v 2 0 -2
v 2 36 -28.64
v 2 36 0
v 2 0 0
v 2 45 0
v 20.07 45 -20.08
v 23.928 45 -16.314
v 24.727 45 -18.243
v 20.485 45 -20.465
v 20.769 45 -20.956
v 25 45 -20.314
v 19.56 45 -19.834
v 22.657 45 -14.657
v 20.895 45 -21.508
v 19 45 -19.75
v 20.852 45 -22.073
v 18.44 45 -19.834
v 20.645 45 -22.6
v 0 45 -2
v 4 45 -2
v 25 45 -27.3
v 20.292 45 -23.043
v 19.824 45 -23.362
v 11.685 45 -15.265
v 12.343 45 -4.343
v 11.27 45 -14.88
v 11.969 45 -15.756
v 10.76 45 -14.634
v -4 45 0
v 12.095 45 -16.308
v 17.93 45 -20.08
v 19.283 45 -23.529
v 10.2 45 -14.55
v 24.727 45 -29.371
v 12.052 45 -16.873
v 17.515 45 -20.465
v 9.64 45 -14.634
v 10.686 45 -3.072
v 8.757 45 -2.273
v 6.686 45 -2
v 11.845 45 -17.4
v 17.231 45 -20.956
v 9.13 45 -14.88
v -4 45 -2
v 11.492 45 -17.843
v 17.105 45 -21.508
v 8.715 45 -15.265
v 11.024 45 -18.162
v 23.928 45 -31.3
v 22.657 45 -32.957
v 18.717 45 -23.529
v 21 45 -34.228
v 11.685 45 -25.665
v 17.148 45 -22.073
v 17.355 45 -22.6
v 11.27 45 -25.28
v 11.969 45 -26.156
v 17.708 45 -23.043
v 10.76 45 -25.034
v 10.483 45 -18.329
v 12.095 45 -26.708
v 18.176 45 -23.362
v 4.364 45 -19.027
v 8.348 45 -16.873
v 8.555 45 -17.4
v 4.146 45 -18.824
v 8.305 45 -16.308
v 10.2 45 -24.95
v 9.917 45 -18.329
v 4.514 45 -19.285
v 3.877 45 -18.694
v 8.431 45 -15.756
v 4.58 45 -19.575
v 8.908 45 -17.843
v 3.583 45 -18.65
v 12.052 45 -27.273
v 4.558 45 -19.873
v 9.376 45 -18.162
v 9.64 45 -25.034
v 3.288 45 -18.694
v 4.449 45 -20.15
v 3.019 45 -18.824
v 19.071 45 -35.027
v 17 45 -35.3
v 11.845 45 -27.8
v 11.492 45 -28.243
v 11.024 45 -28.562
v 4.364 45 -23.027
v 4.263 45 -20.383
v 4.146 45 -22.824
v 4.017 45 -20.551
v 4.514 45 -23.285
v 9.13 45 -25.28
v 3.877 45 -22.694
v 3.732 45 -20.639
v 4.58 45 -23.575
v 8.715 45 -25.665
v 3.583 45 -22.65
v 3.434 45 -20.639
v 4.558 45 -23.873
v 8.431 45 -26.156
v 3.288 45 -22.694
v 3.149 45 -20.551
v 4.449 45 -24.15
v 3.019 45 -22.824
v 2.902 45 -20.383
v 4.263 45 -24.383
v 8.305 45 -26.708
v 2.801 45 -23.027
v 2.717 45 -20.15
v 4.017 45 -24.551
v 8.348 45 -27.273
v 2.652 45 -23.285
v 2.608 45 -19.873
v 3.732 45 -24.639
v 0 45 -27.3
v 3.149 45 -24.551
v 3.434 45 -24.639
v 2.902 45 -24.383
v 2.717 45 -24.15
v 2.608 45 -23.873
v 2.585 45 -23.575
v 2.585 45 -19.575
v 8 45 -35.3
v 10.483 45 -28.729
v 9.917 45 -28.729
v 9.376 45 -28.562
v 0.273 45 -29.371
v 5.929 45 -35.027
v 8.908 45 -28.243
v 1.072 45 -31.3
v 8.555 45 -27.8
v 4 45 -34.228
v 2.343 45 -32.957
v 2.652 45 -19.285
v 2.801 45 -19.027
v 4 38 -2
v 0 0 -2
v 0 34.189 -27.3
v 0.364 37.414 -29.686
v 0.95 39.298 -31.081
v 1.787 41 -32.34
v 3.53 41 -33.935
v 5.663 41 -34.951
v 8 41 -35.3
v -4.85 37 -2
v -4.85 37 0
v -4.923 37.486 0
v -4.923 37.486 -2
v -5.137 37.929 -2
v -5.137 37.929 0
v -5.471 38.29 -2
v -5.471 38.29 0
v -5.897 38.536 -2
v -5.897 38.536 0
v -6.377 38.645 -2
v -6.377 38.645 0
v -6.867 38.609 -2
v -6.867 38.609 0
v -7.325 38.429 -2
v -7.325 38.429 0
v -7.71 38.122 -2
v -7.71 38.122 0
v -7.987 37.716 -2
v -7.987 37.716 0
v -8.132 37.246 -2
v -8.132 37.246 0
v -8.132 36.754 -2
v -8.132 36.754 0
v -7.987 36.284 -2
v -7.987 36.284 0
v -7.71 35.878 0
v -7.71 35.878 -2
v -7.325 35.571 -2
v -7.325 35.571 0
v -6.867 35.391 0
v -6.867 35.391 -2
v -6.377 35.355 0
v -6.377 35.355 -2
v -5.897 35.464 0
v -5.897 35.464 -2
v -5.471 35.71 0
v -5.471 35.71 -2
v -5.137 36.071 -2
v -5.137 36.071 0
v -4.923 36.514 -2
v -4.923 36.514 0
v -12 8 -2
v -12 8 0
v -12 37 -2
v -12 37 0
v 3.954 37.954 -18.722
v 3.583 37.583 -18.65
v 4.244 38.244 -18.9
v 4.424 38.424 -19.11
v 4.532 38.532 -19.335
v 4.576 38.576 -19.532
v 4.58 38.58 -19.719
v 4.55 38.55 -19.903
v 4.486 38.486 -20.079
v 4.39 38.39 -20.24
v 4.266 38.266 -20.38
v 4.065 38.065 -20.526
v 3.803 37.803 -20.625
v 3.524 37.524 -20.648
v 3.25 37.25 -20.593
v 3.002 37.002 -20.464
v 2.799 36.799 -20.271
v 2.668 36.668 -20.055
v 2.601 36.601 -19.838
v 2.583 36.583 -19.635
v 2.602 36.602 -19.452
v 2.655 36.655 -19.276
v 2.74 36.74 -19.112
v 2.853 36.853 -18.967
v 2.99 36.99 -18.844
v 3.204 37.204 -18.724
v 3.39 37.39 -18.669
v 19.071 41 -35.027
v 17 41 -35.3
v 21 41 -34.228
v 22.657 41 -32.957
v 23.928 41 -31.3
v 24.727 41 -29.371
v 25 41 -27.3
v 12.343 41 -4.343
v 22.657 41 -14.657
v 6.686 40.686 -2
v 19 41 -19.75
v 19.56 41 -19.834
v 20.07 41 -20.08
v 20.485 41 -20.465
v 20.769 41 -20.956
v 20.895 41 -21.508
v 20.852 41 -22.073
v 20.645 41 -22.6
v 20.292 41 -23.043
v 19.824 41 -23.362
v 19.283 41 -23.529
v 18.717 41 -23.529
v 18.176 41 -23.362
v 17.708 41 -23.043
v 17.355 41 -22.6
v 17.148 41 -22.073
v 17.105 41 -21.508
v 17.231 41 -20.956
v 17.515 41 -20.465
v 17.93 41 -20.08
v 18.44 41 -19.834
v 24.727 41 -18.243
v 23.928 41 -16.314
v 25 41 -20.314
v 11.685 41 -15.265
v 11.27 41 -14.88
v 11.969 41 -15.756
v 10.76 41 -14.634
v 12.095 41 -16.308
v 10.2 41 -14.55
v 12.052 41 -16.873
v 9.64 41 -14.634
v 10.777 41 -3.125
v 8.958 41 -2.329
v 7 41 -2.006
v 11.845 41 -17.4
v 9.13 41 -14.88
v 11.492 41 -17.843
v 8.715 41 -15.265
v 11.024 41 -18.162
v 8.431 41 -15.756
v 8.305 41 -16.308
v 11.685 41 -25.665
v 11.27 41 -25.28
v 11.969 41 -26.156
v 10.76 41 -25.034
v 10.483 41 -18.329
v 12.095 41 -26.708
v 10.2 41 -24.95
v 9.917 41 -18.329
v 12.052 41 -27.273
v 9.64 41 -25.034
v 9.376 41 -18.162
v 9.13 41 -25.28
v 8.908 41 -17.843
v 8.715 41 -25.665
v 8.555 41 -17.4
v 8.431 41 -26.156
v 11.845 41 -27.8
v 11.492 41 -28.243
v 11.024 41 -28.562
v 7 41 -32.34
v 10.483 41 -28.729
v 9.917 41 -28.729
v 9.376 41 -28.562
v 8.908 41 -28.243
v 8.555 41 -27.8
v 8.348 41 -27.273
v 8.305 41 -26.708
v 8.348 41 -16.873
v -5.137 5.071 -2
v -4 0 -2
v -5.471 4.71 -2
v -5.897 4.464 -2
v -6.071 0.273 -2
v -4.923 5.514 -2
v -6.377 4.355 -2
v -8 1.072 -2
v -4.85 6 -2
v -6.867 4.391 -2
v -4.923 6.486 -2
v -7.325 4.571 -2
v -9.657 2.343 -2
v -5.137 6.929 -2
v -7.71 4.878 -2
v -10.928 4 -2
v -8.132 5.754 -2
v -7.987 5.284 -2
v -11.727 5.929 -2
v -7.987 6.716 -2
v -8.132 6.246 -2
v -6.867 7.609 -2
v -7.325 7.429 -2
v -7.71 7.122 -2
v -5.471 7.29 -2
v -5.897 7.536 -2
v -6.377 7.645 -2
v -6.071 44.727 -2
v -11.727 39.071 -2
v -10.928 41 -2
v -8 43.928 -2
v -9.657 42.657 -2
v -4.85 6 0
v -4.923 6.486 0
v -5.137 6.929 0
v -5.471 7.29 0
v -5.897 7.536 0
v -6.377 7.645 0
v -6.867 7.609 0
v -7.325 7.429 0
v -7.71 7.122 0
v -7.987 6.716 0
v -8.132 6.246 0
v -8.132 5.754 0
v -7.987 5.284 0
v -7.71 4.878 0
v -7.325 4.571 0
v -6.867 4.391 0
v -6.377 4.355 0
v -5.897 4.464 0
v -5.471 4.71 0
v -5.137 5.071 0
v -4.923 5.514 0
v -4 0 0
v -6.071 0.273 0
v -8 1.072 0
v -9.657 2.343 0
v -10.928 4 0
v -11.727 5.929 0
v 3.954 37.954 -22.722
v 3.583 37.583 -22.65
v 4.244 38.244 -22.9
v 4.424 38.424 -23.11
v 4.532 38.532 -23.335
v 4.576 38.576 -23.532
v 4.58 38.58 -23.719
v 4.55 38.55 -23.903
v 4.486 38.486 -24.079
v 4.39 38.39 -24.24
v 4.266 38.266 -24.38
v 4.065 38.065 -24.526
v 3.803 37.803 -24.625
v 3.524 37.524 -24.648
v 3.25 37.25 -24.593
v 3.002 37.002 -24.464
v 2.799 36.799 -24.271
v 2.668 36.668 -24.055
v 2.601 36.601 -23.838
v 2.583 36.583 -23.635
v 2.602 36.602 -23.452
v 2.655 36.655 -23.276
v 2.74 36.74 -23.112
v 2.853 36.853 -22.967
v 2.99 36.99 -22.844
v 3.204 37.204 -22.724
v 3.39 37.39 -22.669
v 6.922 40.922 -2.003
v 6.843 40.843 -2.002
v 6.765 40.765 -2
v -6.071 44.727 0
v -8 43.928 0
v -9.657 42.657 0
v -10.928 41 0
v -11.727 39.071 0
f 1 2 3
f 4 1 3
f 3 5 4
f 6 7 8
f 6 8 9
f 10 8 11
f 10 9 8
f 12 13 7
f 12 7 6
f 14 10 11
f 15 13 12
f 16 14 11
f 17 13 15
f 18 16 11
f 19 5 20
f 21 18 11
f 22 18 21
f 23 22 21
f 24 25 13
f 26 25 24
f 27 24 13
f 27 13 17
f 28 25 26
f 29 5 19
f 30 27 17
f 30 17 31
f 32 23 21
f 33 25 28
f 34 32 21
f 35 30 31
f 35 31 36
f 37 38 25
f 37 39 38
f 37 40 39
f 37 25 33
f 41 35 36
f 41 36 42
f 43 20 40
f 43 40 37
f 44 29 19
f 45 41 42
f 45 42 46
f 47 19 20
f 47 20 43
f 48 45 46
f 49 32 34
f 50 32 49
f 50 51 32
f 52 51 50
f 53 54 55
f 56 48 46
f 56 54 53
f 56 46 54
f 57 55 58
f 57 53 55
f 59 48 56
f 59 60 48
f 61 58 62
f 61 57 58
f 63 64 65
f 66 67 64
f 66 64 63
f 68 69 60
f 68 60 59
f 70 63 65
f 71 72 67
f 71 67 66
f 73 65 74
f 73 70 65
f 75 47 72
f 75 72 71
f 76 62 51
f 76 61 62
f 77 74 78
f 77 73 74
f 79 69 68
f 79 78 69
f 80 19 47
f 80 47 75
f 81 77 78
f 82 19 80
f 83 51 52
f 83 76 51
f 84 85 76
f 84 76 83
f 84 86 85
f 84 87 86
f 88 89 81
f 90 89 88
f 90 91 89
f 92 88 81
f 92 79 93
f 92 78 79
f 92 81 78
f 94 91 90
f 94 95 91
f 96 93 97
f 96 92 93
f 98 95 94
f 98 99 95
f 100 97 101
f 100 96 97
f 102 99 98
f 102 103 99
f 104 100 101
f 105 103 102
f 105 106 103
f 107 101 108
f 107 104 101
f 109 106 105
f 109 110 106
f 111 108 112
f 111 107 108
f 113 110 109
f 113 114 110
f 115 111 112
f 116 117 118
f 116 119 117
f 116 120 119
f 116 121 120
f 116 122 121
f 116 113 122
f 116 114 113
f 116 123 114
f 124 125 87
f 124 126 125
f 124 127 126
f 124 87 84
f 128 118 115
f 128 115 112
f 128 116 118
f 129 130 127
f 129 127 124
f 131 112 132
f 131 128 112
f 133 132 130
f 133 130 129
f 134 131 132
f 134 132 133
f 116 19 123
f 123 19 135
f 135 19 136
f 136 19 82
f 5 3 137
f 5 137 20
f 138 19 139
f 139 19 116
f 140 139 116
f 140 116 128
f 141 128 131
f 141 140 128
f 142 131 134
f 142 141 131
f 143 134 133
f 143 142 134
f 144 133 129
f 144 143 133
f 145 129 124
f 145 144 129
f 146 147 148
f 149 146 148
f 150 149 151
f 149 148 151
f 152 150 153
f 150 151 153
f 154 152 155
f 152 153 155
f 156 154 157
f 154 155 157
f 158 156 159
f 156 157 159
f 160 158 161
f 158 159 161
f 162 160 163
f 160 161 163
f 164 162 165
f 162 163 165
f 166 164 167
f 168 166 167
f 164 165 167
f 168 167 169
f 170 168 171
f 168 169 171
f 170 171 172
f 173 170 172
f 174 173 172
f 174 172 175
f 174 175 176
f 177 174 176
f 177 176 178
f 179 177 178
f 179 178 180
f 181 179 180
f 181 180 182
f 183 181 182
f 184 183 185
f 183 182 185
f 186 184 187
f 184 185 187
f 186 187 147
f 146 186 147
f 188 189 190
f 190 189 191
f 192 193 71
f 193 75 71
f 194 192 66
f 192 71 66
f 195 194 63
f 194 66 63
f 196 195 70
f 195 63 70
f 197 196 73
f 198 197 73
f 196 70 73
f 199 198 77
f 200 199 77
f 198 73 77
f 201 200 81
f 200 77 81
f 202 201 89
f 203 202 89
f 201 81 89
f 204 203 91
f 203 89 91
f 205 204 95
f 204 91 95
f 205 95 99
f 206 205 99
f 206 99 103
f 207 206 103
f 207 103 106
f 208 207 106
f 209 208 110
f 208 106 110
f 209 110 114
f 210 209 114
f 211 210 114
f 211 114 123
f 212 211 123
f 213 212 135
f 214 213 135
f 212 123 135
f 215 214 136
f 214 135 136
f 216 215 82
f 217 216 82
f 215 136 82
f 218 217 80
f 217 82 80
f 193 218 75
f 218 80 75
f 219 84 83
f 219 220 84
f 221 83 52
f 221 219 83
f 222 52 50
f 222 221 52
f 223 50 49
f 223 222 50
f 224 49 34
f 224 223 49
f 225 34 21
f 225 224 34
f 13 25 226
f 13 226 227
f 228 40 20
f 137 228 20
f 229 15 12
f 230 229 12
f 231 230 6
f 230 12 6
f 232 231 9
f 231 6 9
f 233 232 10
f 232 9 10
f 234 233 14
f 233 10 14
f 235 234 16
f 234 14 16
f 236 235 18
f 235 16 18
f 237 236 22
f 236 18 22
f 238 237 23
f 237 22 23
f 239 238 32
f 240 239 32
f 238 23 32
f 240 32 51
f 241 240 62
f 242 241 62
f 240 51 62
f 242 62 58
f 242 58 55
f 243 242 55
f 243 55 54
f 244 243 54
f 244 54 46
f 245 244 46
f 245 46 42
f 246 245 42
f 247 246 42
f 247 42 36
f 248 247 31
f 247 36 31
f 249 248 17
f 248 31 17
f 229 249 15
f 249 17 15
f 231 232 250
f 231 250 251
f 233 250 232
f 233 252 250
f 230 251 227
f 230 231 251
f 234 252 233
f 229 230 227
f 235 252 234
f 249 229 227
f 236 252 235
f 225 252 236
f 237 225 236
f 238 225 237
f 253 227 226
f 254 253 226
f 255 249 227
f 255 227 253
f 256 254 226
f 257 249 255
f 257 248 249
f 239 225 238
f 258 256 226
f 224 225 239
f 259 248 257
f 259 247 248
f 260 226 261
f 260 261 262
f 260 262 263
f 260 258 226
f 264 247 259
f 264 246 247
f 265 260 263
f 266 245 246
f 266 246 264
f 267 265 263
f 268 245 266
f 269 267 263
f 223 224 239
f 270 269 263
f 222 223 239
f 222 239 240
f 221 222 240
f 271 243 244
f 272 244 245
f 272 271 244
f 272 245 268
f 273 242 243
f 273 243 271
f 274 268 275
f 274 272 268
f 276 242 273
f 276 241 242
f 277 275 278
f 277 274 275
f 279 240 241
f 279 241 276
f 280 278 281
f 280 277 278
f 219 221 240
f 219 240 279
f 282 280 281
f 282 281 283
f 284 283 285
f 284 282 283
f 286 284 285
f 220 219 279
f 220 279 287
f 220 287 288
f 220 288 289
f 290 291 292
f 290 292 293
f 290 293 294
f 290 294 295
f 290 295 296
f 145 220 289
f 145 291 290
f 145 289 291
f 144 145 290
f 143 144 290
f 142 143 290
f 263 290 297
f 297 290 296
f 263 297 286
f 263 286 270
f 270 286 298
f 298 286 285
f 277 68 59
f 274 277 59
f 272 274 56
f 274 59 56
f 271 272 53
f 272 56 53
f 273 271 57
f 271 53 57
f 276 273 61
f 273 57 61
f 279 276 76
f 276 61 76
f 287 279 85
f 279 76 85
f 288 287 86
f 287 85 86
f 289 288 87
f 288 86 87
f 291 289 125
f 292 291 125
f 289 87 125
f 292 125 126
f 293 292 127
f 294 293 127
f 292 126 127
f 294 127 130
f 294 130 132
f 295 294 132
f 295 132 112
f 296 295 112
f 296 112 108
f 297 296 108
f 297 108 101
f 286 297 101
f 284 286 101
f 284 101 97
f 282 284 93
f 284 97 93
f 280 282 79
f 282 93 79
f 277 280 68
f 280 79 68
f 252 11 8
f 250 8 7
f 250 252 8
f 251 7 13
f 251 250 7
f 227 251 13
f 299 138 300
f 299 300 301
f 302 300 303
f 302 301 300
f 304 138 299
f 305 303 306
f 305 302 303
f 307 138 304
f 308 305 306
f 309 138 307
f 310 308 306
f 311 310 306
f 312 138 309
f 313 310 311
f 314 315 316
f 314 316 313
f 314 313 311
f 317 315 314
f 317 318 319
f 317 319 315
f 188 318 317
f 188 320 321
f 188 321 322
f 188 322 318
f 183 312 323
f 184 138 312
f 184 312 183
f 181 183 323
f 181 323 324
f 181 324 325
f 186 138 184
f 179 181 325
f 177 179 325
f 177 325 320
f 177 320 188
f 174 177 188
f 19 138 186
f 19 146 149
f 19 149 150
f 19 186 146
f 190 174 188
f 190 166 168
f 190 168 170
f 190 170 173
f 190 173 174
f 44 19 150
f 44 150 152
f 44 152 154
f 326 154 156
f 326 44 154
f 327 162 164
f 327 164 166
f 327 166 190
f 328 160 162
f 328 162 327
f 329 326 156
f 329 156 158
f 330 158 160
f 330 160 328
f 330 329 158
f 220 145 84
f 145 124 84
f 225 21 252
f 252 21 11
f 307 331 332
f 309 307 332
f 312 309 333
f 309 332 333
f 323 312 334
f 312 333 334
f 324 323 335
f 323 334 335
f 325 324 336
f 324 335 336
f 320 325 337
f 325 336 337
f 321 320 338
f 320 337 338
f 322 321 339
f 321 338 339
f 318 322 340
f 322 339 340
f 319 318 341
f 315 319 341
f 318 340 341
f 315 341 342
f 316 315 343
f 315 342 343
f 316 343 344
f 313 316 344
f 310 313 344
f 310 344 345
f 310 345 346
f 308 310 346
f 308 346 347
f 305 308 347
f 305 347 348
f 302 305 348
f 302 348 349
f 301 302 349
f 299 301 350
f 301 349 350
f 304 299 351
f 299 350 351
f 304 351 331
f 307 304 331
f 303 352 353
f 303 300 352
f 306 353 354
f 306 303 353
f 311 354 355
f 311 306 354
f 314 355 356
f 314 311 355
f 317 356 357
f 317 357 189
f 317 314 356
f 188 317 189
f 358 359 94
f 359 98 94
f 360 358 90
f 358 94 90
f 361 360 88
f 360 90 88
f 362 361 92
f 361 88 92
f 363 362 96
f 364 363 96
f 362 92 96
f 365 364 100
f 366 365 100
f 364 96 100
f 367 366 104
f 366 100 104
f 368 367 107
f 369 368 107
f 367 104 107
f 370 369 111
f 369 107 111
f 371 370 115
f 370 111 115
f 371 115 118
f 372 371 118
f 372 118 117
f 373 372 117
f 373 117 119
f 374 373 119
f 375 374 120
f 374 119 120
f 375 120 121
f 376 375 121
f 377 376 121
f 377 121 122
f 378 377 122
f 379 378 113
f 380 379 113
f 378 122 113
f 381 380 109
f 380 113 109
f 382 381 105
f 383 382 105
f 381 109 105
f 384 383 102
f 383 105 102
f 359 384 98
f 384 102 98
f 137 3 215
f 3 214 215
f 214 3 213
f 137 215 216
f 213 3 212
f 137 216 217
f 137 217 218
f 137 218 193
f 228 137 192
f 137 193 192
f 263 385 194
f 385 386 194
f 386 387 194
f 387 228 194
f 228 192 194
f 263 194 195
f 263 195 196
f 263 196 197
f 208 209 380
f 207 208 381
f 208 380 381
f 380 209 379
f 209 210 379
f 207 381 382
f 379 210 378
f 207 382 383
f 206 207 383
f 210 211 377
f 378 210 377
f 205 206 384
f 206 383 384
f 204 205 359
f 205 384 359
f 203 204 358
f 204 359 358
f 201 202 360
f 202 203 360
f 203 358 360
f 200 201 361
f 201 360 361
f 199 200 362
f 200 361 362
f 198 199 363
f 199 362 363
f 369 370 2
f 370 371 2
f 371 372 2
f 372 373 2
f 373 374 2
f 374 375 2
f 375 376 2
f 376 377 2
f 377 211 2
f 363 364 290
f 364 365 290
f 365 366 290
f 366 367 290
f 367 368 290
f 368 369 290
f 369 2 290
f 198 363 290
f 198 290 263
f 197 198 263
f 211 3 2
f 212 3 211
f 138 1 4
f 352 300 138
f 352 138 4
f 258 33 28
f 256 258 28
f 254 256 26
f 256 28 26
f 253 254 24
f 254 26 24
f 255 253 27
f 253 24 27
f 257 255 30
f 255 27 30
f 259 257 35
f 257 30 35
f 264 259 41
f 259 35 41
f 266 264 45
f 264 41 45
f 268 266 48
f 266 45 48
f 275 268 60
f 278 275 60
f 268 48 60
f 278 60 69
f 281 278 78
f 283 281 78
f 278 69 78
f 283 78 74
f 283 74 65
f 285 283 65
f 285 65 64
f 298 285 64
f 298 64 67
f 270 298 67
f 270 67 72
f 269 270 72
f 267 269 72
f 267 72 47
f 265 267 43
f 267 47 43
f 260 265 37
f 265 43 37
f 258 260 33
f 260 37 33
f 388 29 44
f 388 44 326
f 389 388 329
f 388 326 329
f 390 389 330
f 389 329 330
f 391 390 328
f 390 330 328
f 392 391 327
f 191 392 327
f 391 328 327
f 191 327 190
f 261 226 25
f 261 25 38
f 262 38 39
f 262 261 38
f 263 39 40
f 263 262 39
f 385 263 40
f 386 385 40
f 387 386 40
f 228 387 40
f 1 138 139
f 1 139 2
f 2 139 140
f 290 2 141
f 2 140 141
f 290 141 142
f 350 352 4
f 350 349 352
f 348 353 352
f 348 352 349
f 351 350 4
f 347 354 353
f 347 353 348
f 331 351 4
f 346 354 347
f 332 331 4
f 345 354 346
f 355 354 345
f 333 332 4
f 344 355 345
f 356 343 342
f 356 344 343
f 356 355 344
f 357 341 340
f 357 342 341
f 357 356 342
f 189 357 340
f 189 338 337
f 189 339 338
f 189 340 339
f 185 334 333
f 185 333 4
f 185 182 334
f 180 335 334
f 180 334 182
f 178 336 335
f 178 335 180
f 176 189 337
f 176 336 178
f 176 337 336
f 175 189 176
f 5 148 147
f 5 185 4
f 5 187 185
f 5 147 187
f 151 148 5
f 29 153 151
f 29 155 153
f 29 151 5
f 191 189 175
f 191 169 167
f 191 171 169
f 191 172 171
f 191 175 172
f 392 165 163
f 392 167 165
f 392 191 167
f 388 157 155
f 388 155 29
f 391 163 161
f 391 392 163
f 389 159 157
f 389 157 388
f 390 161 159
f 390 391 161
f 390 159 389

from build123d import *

# Parameters (mm, degrees)
SKETCH1_R           = 1.6500000000000001
SKETCH1_R_2         = 1.6500000000000006
BOSS_EXTRUDE1_DEPTH = 2
BOSS_EXTRUDE2_DEPTH = 2
BOSS_EXTRUDE3_DEPTH = 4
SKETCH4_R           = 1.8999999999999948
SKETCH4_R_2         = 1.8999999999999964
SKETCH4_R_3         = 1.8999999999999981
CUT_EXTRUDE1_DEPTH  = 4
SKETCH5_R           = 1.0000000000000009
SKETCH5_R_2         = 1
SKETCH5_R_3         = 1.8999999999999981
CUT_EXTRUDE2_DEPTH  = 63.418667079648536
CUT_EXTRUDE3_DEPTH  = 4
CHAMFER1_SIZE       = 5
CHAMFER2_SIZE       = 2
FILLET1_R           = 8
FILLET2_R           = 8
FILLET3_R           = 8


# Some blends are built 0.0001 mm under size
with BuildPart() as part:
    # Sketch1 → Boss-Extrude1 (new body)
    with BuildSketch(Plane.XY):
        Polygon((0, 0), (-12, -1.47e-15), (-12, 45), (0, 45), align=None)
        with Locations((-6.499999999999999, 37)):
            Circle(SKETCH1_R, mode=Mode.SUBTRACT)
        with Locations((-6.5000000000000036, 5.999999999999999)):
            Circle(SKETCH1_R_2, mode=Mode.SUBTRACT)
    extrude(amount=-BOSS_EXTRUDE1_DEPTH)

    # Sketch2 → Boss-Extrude2 (add)
    with BuildSketch(Plane(origin=(0, 0, 0), x_dir=(0, 0, -1), z_dir=(1, 0, 0))):
        Polygon((35.3, 45), (2, 0), (5.51e-15, 0), (0, 45), align=None)
    extrude(amount=BOSS_EXTRUDE2_DEPTH)

    # Sketch3 → Boss-Extrude3 (add)
    with BuildSketch(Plane(origin=(0, 45, 0), x_dir=(1, 0, 0), z_dir=(0, 1, 0))):
        Polygon((-6.1e-16, 35.3), (25, 35.3), (25.000000000000004, 1.9999999999999991), (3.47e-15, 1.9999999999999991), align=None)
    extrude(amount=-BOSS_EXTRUDE3_DEPTH)

    # Sketch4 → Cut-Extrude1 (cut)
    with BuildSketch(Plane(origin=(0, 45, 0), x_dir=(1, 0, 0), z_dir=(0, 1, 0))):
        with Locations(Location((10.199999999999998, 26.849999999999998, 0), (0, 0, 270))):
            Circle(SKETCH4_R)
        with Locations(Location((10.2, 16.45, 0), (0, 0, 270))):
            Circle(SKETCH4_R_2)
        with Locations(Location((18.999999999999996, 21.65, 0), (0, 0, 270))):
            Circle(SKETCH4_R_3)
    extrude(amount=-CUT_EXTRUDE1_DEPTH, mode=Mode.SUBTRACT)

    # Sketch5 → Cut-Extrude2 (cut, through all)
    with BuildSketch(Plane(origin=(0, 45, 0), x_dir=(1, 0, 0), z_dir=(0, 1, 0))):
        with Locations(Location((3.5826389249908894, 23.65, 0), (0, 0, 270))):
            Circle(SKETCH5_R)
        with Locations(Location((3.5826389249908894, 19.650000000000002, 0), (0, 0, 270))):
            Circle(SKETCH5_R_2)
        with Locations(Location((18.999999999999996, 21.65, 0), (0, 0, 270))):
            Circle(SKETCH5_R_3)
    extrude(amount=-CUT_EXTRUDE2_DEPTH, mode=Mode.SUBTRACT)

    # Sketch6 → Cut-Extrude3 (cut)
    with BuildSketch(Plane(origin=(0, 45, 0), x_dir=(1, 0, 0), z_dir=(0, 1, 0))):
        Polygon((10.000000000000005, 1.9999999999999991), (25.000000000000004, 16.99999999999984), (25.000000000000004, 1.9999999999999991), align=None)
    extrude(amount=-CUT_EXTRUDE3_DEPTH, mode=Mode.SUBTRACT)

    # Chamfer1
    # the kernel refuses this chamfer: 5 mm, written as the material it adds along each edge
    with BuildSketch(Plane(origin=(2, 41, -45.19841493982955), x_dir=(-0.02749587661058636, -0.9996219169112968, 0), z_dir=(0, 0, 1))) as chamfer1_piece_1_section:
        Polygon((CHAMFER1_SIZE * 0.999621916911, CHAMFER1_SIZE * 0.0274958766106), (-CHAMFER1_SIZE * 0.0274958766106, CHAMFER1_SIZE * 0.999621916911), (0, 0), align=None)
    chamfer1_piece_1 = extrude(amount=43.19841493982955, mode=Mode.PRIVATE)
    chamfer1_piece_1 = split(chamfer1_piece_1, bisect_by=Plane(origin=(3.679771833975431, 32.284665683470884, -25.89065260576845), z_dir=(0, 0.5948430054102947, 0.8038418992031009)), keep=Keep.TOP, mode=Mode.PRIVATE)
    chamfer1_piece_1 = chamfer1_piece_1 - Plane(origin=(3.5826389249908894, 39.396771086693036, -19.650000000000002), x_dir=(-1.8e-16, 0, 1), z_dir=(0, 1, 0)) * Cylinder(1, 107, mode=Mode.PRIVATE)
    chamfer1_piece_1 = chamfer1_piece_1 - Plane(origin=(3.5826389249908894, 39.396771086693036, -23.65), x_dir=(-1.8e-16, 0, 1), z_dir=(0, 1, 0)) * Cylinder(1.0000000000000009, 107, mode=Mode.PRIVATE)
    add(chamfer1_piece_1)

    # Chamfer2
    chamfer2_edges = [part.edges().sort_by_distance(p)[0] for p in [
        (1.9999999999990004, 40.50000000000074, -1.9999999999999996),
    ]]
    chamfer(chamfer2_edges, length=CHAMFER2_SIZE - 0.0001)  # a hair under: the kernel refuses the full size

    # Fillet1
    fillet1_edges = [part.edges().sort_by_distance(p)[0] for p in [
        (-12, -1.47e-15, -1),
        (-12, 45, -1),
    ]]
    fillet(fillet1_edges, radius=FILLET1_R)

    # Fillet2
    fillet2_edges = [part.edges().sort_by_distance(p)[0] for p in [
        (-6.1e-16, 43, -35.3),
        (25, 43, -35.3),
    ]]
    fillet(fillet2_edges, radius=FILLET2_R)

    # Fillet3
    fillet3_edges = [part.edges().sort_by_distance(p)[0] for p in [
        (10.000000000000005, 43, -1.9999999999999991),
        (25.000000000000004, 43, -16.99999999999984),
    ]]
    fillet(fillet3_edges, radius=FILLET3_R)


solid = part.part
